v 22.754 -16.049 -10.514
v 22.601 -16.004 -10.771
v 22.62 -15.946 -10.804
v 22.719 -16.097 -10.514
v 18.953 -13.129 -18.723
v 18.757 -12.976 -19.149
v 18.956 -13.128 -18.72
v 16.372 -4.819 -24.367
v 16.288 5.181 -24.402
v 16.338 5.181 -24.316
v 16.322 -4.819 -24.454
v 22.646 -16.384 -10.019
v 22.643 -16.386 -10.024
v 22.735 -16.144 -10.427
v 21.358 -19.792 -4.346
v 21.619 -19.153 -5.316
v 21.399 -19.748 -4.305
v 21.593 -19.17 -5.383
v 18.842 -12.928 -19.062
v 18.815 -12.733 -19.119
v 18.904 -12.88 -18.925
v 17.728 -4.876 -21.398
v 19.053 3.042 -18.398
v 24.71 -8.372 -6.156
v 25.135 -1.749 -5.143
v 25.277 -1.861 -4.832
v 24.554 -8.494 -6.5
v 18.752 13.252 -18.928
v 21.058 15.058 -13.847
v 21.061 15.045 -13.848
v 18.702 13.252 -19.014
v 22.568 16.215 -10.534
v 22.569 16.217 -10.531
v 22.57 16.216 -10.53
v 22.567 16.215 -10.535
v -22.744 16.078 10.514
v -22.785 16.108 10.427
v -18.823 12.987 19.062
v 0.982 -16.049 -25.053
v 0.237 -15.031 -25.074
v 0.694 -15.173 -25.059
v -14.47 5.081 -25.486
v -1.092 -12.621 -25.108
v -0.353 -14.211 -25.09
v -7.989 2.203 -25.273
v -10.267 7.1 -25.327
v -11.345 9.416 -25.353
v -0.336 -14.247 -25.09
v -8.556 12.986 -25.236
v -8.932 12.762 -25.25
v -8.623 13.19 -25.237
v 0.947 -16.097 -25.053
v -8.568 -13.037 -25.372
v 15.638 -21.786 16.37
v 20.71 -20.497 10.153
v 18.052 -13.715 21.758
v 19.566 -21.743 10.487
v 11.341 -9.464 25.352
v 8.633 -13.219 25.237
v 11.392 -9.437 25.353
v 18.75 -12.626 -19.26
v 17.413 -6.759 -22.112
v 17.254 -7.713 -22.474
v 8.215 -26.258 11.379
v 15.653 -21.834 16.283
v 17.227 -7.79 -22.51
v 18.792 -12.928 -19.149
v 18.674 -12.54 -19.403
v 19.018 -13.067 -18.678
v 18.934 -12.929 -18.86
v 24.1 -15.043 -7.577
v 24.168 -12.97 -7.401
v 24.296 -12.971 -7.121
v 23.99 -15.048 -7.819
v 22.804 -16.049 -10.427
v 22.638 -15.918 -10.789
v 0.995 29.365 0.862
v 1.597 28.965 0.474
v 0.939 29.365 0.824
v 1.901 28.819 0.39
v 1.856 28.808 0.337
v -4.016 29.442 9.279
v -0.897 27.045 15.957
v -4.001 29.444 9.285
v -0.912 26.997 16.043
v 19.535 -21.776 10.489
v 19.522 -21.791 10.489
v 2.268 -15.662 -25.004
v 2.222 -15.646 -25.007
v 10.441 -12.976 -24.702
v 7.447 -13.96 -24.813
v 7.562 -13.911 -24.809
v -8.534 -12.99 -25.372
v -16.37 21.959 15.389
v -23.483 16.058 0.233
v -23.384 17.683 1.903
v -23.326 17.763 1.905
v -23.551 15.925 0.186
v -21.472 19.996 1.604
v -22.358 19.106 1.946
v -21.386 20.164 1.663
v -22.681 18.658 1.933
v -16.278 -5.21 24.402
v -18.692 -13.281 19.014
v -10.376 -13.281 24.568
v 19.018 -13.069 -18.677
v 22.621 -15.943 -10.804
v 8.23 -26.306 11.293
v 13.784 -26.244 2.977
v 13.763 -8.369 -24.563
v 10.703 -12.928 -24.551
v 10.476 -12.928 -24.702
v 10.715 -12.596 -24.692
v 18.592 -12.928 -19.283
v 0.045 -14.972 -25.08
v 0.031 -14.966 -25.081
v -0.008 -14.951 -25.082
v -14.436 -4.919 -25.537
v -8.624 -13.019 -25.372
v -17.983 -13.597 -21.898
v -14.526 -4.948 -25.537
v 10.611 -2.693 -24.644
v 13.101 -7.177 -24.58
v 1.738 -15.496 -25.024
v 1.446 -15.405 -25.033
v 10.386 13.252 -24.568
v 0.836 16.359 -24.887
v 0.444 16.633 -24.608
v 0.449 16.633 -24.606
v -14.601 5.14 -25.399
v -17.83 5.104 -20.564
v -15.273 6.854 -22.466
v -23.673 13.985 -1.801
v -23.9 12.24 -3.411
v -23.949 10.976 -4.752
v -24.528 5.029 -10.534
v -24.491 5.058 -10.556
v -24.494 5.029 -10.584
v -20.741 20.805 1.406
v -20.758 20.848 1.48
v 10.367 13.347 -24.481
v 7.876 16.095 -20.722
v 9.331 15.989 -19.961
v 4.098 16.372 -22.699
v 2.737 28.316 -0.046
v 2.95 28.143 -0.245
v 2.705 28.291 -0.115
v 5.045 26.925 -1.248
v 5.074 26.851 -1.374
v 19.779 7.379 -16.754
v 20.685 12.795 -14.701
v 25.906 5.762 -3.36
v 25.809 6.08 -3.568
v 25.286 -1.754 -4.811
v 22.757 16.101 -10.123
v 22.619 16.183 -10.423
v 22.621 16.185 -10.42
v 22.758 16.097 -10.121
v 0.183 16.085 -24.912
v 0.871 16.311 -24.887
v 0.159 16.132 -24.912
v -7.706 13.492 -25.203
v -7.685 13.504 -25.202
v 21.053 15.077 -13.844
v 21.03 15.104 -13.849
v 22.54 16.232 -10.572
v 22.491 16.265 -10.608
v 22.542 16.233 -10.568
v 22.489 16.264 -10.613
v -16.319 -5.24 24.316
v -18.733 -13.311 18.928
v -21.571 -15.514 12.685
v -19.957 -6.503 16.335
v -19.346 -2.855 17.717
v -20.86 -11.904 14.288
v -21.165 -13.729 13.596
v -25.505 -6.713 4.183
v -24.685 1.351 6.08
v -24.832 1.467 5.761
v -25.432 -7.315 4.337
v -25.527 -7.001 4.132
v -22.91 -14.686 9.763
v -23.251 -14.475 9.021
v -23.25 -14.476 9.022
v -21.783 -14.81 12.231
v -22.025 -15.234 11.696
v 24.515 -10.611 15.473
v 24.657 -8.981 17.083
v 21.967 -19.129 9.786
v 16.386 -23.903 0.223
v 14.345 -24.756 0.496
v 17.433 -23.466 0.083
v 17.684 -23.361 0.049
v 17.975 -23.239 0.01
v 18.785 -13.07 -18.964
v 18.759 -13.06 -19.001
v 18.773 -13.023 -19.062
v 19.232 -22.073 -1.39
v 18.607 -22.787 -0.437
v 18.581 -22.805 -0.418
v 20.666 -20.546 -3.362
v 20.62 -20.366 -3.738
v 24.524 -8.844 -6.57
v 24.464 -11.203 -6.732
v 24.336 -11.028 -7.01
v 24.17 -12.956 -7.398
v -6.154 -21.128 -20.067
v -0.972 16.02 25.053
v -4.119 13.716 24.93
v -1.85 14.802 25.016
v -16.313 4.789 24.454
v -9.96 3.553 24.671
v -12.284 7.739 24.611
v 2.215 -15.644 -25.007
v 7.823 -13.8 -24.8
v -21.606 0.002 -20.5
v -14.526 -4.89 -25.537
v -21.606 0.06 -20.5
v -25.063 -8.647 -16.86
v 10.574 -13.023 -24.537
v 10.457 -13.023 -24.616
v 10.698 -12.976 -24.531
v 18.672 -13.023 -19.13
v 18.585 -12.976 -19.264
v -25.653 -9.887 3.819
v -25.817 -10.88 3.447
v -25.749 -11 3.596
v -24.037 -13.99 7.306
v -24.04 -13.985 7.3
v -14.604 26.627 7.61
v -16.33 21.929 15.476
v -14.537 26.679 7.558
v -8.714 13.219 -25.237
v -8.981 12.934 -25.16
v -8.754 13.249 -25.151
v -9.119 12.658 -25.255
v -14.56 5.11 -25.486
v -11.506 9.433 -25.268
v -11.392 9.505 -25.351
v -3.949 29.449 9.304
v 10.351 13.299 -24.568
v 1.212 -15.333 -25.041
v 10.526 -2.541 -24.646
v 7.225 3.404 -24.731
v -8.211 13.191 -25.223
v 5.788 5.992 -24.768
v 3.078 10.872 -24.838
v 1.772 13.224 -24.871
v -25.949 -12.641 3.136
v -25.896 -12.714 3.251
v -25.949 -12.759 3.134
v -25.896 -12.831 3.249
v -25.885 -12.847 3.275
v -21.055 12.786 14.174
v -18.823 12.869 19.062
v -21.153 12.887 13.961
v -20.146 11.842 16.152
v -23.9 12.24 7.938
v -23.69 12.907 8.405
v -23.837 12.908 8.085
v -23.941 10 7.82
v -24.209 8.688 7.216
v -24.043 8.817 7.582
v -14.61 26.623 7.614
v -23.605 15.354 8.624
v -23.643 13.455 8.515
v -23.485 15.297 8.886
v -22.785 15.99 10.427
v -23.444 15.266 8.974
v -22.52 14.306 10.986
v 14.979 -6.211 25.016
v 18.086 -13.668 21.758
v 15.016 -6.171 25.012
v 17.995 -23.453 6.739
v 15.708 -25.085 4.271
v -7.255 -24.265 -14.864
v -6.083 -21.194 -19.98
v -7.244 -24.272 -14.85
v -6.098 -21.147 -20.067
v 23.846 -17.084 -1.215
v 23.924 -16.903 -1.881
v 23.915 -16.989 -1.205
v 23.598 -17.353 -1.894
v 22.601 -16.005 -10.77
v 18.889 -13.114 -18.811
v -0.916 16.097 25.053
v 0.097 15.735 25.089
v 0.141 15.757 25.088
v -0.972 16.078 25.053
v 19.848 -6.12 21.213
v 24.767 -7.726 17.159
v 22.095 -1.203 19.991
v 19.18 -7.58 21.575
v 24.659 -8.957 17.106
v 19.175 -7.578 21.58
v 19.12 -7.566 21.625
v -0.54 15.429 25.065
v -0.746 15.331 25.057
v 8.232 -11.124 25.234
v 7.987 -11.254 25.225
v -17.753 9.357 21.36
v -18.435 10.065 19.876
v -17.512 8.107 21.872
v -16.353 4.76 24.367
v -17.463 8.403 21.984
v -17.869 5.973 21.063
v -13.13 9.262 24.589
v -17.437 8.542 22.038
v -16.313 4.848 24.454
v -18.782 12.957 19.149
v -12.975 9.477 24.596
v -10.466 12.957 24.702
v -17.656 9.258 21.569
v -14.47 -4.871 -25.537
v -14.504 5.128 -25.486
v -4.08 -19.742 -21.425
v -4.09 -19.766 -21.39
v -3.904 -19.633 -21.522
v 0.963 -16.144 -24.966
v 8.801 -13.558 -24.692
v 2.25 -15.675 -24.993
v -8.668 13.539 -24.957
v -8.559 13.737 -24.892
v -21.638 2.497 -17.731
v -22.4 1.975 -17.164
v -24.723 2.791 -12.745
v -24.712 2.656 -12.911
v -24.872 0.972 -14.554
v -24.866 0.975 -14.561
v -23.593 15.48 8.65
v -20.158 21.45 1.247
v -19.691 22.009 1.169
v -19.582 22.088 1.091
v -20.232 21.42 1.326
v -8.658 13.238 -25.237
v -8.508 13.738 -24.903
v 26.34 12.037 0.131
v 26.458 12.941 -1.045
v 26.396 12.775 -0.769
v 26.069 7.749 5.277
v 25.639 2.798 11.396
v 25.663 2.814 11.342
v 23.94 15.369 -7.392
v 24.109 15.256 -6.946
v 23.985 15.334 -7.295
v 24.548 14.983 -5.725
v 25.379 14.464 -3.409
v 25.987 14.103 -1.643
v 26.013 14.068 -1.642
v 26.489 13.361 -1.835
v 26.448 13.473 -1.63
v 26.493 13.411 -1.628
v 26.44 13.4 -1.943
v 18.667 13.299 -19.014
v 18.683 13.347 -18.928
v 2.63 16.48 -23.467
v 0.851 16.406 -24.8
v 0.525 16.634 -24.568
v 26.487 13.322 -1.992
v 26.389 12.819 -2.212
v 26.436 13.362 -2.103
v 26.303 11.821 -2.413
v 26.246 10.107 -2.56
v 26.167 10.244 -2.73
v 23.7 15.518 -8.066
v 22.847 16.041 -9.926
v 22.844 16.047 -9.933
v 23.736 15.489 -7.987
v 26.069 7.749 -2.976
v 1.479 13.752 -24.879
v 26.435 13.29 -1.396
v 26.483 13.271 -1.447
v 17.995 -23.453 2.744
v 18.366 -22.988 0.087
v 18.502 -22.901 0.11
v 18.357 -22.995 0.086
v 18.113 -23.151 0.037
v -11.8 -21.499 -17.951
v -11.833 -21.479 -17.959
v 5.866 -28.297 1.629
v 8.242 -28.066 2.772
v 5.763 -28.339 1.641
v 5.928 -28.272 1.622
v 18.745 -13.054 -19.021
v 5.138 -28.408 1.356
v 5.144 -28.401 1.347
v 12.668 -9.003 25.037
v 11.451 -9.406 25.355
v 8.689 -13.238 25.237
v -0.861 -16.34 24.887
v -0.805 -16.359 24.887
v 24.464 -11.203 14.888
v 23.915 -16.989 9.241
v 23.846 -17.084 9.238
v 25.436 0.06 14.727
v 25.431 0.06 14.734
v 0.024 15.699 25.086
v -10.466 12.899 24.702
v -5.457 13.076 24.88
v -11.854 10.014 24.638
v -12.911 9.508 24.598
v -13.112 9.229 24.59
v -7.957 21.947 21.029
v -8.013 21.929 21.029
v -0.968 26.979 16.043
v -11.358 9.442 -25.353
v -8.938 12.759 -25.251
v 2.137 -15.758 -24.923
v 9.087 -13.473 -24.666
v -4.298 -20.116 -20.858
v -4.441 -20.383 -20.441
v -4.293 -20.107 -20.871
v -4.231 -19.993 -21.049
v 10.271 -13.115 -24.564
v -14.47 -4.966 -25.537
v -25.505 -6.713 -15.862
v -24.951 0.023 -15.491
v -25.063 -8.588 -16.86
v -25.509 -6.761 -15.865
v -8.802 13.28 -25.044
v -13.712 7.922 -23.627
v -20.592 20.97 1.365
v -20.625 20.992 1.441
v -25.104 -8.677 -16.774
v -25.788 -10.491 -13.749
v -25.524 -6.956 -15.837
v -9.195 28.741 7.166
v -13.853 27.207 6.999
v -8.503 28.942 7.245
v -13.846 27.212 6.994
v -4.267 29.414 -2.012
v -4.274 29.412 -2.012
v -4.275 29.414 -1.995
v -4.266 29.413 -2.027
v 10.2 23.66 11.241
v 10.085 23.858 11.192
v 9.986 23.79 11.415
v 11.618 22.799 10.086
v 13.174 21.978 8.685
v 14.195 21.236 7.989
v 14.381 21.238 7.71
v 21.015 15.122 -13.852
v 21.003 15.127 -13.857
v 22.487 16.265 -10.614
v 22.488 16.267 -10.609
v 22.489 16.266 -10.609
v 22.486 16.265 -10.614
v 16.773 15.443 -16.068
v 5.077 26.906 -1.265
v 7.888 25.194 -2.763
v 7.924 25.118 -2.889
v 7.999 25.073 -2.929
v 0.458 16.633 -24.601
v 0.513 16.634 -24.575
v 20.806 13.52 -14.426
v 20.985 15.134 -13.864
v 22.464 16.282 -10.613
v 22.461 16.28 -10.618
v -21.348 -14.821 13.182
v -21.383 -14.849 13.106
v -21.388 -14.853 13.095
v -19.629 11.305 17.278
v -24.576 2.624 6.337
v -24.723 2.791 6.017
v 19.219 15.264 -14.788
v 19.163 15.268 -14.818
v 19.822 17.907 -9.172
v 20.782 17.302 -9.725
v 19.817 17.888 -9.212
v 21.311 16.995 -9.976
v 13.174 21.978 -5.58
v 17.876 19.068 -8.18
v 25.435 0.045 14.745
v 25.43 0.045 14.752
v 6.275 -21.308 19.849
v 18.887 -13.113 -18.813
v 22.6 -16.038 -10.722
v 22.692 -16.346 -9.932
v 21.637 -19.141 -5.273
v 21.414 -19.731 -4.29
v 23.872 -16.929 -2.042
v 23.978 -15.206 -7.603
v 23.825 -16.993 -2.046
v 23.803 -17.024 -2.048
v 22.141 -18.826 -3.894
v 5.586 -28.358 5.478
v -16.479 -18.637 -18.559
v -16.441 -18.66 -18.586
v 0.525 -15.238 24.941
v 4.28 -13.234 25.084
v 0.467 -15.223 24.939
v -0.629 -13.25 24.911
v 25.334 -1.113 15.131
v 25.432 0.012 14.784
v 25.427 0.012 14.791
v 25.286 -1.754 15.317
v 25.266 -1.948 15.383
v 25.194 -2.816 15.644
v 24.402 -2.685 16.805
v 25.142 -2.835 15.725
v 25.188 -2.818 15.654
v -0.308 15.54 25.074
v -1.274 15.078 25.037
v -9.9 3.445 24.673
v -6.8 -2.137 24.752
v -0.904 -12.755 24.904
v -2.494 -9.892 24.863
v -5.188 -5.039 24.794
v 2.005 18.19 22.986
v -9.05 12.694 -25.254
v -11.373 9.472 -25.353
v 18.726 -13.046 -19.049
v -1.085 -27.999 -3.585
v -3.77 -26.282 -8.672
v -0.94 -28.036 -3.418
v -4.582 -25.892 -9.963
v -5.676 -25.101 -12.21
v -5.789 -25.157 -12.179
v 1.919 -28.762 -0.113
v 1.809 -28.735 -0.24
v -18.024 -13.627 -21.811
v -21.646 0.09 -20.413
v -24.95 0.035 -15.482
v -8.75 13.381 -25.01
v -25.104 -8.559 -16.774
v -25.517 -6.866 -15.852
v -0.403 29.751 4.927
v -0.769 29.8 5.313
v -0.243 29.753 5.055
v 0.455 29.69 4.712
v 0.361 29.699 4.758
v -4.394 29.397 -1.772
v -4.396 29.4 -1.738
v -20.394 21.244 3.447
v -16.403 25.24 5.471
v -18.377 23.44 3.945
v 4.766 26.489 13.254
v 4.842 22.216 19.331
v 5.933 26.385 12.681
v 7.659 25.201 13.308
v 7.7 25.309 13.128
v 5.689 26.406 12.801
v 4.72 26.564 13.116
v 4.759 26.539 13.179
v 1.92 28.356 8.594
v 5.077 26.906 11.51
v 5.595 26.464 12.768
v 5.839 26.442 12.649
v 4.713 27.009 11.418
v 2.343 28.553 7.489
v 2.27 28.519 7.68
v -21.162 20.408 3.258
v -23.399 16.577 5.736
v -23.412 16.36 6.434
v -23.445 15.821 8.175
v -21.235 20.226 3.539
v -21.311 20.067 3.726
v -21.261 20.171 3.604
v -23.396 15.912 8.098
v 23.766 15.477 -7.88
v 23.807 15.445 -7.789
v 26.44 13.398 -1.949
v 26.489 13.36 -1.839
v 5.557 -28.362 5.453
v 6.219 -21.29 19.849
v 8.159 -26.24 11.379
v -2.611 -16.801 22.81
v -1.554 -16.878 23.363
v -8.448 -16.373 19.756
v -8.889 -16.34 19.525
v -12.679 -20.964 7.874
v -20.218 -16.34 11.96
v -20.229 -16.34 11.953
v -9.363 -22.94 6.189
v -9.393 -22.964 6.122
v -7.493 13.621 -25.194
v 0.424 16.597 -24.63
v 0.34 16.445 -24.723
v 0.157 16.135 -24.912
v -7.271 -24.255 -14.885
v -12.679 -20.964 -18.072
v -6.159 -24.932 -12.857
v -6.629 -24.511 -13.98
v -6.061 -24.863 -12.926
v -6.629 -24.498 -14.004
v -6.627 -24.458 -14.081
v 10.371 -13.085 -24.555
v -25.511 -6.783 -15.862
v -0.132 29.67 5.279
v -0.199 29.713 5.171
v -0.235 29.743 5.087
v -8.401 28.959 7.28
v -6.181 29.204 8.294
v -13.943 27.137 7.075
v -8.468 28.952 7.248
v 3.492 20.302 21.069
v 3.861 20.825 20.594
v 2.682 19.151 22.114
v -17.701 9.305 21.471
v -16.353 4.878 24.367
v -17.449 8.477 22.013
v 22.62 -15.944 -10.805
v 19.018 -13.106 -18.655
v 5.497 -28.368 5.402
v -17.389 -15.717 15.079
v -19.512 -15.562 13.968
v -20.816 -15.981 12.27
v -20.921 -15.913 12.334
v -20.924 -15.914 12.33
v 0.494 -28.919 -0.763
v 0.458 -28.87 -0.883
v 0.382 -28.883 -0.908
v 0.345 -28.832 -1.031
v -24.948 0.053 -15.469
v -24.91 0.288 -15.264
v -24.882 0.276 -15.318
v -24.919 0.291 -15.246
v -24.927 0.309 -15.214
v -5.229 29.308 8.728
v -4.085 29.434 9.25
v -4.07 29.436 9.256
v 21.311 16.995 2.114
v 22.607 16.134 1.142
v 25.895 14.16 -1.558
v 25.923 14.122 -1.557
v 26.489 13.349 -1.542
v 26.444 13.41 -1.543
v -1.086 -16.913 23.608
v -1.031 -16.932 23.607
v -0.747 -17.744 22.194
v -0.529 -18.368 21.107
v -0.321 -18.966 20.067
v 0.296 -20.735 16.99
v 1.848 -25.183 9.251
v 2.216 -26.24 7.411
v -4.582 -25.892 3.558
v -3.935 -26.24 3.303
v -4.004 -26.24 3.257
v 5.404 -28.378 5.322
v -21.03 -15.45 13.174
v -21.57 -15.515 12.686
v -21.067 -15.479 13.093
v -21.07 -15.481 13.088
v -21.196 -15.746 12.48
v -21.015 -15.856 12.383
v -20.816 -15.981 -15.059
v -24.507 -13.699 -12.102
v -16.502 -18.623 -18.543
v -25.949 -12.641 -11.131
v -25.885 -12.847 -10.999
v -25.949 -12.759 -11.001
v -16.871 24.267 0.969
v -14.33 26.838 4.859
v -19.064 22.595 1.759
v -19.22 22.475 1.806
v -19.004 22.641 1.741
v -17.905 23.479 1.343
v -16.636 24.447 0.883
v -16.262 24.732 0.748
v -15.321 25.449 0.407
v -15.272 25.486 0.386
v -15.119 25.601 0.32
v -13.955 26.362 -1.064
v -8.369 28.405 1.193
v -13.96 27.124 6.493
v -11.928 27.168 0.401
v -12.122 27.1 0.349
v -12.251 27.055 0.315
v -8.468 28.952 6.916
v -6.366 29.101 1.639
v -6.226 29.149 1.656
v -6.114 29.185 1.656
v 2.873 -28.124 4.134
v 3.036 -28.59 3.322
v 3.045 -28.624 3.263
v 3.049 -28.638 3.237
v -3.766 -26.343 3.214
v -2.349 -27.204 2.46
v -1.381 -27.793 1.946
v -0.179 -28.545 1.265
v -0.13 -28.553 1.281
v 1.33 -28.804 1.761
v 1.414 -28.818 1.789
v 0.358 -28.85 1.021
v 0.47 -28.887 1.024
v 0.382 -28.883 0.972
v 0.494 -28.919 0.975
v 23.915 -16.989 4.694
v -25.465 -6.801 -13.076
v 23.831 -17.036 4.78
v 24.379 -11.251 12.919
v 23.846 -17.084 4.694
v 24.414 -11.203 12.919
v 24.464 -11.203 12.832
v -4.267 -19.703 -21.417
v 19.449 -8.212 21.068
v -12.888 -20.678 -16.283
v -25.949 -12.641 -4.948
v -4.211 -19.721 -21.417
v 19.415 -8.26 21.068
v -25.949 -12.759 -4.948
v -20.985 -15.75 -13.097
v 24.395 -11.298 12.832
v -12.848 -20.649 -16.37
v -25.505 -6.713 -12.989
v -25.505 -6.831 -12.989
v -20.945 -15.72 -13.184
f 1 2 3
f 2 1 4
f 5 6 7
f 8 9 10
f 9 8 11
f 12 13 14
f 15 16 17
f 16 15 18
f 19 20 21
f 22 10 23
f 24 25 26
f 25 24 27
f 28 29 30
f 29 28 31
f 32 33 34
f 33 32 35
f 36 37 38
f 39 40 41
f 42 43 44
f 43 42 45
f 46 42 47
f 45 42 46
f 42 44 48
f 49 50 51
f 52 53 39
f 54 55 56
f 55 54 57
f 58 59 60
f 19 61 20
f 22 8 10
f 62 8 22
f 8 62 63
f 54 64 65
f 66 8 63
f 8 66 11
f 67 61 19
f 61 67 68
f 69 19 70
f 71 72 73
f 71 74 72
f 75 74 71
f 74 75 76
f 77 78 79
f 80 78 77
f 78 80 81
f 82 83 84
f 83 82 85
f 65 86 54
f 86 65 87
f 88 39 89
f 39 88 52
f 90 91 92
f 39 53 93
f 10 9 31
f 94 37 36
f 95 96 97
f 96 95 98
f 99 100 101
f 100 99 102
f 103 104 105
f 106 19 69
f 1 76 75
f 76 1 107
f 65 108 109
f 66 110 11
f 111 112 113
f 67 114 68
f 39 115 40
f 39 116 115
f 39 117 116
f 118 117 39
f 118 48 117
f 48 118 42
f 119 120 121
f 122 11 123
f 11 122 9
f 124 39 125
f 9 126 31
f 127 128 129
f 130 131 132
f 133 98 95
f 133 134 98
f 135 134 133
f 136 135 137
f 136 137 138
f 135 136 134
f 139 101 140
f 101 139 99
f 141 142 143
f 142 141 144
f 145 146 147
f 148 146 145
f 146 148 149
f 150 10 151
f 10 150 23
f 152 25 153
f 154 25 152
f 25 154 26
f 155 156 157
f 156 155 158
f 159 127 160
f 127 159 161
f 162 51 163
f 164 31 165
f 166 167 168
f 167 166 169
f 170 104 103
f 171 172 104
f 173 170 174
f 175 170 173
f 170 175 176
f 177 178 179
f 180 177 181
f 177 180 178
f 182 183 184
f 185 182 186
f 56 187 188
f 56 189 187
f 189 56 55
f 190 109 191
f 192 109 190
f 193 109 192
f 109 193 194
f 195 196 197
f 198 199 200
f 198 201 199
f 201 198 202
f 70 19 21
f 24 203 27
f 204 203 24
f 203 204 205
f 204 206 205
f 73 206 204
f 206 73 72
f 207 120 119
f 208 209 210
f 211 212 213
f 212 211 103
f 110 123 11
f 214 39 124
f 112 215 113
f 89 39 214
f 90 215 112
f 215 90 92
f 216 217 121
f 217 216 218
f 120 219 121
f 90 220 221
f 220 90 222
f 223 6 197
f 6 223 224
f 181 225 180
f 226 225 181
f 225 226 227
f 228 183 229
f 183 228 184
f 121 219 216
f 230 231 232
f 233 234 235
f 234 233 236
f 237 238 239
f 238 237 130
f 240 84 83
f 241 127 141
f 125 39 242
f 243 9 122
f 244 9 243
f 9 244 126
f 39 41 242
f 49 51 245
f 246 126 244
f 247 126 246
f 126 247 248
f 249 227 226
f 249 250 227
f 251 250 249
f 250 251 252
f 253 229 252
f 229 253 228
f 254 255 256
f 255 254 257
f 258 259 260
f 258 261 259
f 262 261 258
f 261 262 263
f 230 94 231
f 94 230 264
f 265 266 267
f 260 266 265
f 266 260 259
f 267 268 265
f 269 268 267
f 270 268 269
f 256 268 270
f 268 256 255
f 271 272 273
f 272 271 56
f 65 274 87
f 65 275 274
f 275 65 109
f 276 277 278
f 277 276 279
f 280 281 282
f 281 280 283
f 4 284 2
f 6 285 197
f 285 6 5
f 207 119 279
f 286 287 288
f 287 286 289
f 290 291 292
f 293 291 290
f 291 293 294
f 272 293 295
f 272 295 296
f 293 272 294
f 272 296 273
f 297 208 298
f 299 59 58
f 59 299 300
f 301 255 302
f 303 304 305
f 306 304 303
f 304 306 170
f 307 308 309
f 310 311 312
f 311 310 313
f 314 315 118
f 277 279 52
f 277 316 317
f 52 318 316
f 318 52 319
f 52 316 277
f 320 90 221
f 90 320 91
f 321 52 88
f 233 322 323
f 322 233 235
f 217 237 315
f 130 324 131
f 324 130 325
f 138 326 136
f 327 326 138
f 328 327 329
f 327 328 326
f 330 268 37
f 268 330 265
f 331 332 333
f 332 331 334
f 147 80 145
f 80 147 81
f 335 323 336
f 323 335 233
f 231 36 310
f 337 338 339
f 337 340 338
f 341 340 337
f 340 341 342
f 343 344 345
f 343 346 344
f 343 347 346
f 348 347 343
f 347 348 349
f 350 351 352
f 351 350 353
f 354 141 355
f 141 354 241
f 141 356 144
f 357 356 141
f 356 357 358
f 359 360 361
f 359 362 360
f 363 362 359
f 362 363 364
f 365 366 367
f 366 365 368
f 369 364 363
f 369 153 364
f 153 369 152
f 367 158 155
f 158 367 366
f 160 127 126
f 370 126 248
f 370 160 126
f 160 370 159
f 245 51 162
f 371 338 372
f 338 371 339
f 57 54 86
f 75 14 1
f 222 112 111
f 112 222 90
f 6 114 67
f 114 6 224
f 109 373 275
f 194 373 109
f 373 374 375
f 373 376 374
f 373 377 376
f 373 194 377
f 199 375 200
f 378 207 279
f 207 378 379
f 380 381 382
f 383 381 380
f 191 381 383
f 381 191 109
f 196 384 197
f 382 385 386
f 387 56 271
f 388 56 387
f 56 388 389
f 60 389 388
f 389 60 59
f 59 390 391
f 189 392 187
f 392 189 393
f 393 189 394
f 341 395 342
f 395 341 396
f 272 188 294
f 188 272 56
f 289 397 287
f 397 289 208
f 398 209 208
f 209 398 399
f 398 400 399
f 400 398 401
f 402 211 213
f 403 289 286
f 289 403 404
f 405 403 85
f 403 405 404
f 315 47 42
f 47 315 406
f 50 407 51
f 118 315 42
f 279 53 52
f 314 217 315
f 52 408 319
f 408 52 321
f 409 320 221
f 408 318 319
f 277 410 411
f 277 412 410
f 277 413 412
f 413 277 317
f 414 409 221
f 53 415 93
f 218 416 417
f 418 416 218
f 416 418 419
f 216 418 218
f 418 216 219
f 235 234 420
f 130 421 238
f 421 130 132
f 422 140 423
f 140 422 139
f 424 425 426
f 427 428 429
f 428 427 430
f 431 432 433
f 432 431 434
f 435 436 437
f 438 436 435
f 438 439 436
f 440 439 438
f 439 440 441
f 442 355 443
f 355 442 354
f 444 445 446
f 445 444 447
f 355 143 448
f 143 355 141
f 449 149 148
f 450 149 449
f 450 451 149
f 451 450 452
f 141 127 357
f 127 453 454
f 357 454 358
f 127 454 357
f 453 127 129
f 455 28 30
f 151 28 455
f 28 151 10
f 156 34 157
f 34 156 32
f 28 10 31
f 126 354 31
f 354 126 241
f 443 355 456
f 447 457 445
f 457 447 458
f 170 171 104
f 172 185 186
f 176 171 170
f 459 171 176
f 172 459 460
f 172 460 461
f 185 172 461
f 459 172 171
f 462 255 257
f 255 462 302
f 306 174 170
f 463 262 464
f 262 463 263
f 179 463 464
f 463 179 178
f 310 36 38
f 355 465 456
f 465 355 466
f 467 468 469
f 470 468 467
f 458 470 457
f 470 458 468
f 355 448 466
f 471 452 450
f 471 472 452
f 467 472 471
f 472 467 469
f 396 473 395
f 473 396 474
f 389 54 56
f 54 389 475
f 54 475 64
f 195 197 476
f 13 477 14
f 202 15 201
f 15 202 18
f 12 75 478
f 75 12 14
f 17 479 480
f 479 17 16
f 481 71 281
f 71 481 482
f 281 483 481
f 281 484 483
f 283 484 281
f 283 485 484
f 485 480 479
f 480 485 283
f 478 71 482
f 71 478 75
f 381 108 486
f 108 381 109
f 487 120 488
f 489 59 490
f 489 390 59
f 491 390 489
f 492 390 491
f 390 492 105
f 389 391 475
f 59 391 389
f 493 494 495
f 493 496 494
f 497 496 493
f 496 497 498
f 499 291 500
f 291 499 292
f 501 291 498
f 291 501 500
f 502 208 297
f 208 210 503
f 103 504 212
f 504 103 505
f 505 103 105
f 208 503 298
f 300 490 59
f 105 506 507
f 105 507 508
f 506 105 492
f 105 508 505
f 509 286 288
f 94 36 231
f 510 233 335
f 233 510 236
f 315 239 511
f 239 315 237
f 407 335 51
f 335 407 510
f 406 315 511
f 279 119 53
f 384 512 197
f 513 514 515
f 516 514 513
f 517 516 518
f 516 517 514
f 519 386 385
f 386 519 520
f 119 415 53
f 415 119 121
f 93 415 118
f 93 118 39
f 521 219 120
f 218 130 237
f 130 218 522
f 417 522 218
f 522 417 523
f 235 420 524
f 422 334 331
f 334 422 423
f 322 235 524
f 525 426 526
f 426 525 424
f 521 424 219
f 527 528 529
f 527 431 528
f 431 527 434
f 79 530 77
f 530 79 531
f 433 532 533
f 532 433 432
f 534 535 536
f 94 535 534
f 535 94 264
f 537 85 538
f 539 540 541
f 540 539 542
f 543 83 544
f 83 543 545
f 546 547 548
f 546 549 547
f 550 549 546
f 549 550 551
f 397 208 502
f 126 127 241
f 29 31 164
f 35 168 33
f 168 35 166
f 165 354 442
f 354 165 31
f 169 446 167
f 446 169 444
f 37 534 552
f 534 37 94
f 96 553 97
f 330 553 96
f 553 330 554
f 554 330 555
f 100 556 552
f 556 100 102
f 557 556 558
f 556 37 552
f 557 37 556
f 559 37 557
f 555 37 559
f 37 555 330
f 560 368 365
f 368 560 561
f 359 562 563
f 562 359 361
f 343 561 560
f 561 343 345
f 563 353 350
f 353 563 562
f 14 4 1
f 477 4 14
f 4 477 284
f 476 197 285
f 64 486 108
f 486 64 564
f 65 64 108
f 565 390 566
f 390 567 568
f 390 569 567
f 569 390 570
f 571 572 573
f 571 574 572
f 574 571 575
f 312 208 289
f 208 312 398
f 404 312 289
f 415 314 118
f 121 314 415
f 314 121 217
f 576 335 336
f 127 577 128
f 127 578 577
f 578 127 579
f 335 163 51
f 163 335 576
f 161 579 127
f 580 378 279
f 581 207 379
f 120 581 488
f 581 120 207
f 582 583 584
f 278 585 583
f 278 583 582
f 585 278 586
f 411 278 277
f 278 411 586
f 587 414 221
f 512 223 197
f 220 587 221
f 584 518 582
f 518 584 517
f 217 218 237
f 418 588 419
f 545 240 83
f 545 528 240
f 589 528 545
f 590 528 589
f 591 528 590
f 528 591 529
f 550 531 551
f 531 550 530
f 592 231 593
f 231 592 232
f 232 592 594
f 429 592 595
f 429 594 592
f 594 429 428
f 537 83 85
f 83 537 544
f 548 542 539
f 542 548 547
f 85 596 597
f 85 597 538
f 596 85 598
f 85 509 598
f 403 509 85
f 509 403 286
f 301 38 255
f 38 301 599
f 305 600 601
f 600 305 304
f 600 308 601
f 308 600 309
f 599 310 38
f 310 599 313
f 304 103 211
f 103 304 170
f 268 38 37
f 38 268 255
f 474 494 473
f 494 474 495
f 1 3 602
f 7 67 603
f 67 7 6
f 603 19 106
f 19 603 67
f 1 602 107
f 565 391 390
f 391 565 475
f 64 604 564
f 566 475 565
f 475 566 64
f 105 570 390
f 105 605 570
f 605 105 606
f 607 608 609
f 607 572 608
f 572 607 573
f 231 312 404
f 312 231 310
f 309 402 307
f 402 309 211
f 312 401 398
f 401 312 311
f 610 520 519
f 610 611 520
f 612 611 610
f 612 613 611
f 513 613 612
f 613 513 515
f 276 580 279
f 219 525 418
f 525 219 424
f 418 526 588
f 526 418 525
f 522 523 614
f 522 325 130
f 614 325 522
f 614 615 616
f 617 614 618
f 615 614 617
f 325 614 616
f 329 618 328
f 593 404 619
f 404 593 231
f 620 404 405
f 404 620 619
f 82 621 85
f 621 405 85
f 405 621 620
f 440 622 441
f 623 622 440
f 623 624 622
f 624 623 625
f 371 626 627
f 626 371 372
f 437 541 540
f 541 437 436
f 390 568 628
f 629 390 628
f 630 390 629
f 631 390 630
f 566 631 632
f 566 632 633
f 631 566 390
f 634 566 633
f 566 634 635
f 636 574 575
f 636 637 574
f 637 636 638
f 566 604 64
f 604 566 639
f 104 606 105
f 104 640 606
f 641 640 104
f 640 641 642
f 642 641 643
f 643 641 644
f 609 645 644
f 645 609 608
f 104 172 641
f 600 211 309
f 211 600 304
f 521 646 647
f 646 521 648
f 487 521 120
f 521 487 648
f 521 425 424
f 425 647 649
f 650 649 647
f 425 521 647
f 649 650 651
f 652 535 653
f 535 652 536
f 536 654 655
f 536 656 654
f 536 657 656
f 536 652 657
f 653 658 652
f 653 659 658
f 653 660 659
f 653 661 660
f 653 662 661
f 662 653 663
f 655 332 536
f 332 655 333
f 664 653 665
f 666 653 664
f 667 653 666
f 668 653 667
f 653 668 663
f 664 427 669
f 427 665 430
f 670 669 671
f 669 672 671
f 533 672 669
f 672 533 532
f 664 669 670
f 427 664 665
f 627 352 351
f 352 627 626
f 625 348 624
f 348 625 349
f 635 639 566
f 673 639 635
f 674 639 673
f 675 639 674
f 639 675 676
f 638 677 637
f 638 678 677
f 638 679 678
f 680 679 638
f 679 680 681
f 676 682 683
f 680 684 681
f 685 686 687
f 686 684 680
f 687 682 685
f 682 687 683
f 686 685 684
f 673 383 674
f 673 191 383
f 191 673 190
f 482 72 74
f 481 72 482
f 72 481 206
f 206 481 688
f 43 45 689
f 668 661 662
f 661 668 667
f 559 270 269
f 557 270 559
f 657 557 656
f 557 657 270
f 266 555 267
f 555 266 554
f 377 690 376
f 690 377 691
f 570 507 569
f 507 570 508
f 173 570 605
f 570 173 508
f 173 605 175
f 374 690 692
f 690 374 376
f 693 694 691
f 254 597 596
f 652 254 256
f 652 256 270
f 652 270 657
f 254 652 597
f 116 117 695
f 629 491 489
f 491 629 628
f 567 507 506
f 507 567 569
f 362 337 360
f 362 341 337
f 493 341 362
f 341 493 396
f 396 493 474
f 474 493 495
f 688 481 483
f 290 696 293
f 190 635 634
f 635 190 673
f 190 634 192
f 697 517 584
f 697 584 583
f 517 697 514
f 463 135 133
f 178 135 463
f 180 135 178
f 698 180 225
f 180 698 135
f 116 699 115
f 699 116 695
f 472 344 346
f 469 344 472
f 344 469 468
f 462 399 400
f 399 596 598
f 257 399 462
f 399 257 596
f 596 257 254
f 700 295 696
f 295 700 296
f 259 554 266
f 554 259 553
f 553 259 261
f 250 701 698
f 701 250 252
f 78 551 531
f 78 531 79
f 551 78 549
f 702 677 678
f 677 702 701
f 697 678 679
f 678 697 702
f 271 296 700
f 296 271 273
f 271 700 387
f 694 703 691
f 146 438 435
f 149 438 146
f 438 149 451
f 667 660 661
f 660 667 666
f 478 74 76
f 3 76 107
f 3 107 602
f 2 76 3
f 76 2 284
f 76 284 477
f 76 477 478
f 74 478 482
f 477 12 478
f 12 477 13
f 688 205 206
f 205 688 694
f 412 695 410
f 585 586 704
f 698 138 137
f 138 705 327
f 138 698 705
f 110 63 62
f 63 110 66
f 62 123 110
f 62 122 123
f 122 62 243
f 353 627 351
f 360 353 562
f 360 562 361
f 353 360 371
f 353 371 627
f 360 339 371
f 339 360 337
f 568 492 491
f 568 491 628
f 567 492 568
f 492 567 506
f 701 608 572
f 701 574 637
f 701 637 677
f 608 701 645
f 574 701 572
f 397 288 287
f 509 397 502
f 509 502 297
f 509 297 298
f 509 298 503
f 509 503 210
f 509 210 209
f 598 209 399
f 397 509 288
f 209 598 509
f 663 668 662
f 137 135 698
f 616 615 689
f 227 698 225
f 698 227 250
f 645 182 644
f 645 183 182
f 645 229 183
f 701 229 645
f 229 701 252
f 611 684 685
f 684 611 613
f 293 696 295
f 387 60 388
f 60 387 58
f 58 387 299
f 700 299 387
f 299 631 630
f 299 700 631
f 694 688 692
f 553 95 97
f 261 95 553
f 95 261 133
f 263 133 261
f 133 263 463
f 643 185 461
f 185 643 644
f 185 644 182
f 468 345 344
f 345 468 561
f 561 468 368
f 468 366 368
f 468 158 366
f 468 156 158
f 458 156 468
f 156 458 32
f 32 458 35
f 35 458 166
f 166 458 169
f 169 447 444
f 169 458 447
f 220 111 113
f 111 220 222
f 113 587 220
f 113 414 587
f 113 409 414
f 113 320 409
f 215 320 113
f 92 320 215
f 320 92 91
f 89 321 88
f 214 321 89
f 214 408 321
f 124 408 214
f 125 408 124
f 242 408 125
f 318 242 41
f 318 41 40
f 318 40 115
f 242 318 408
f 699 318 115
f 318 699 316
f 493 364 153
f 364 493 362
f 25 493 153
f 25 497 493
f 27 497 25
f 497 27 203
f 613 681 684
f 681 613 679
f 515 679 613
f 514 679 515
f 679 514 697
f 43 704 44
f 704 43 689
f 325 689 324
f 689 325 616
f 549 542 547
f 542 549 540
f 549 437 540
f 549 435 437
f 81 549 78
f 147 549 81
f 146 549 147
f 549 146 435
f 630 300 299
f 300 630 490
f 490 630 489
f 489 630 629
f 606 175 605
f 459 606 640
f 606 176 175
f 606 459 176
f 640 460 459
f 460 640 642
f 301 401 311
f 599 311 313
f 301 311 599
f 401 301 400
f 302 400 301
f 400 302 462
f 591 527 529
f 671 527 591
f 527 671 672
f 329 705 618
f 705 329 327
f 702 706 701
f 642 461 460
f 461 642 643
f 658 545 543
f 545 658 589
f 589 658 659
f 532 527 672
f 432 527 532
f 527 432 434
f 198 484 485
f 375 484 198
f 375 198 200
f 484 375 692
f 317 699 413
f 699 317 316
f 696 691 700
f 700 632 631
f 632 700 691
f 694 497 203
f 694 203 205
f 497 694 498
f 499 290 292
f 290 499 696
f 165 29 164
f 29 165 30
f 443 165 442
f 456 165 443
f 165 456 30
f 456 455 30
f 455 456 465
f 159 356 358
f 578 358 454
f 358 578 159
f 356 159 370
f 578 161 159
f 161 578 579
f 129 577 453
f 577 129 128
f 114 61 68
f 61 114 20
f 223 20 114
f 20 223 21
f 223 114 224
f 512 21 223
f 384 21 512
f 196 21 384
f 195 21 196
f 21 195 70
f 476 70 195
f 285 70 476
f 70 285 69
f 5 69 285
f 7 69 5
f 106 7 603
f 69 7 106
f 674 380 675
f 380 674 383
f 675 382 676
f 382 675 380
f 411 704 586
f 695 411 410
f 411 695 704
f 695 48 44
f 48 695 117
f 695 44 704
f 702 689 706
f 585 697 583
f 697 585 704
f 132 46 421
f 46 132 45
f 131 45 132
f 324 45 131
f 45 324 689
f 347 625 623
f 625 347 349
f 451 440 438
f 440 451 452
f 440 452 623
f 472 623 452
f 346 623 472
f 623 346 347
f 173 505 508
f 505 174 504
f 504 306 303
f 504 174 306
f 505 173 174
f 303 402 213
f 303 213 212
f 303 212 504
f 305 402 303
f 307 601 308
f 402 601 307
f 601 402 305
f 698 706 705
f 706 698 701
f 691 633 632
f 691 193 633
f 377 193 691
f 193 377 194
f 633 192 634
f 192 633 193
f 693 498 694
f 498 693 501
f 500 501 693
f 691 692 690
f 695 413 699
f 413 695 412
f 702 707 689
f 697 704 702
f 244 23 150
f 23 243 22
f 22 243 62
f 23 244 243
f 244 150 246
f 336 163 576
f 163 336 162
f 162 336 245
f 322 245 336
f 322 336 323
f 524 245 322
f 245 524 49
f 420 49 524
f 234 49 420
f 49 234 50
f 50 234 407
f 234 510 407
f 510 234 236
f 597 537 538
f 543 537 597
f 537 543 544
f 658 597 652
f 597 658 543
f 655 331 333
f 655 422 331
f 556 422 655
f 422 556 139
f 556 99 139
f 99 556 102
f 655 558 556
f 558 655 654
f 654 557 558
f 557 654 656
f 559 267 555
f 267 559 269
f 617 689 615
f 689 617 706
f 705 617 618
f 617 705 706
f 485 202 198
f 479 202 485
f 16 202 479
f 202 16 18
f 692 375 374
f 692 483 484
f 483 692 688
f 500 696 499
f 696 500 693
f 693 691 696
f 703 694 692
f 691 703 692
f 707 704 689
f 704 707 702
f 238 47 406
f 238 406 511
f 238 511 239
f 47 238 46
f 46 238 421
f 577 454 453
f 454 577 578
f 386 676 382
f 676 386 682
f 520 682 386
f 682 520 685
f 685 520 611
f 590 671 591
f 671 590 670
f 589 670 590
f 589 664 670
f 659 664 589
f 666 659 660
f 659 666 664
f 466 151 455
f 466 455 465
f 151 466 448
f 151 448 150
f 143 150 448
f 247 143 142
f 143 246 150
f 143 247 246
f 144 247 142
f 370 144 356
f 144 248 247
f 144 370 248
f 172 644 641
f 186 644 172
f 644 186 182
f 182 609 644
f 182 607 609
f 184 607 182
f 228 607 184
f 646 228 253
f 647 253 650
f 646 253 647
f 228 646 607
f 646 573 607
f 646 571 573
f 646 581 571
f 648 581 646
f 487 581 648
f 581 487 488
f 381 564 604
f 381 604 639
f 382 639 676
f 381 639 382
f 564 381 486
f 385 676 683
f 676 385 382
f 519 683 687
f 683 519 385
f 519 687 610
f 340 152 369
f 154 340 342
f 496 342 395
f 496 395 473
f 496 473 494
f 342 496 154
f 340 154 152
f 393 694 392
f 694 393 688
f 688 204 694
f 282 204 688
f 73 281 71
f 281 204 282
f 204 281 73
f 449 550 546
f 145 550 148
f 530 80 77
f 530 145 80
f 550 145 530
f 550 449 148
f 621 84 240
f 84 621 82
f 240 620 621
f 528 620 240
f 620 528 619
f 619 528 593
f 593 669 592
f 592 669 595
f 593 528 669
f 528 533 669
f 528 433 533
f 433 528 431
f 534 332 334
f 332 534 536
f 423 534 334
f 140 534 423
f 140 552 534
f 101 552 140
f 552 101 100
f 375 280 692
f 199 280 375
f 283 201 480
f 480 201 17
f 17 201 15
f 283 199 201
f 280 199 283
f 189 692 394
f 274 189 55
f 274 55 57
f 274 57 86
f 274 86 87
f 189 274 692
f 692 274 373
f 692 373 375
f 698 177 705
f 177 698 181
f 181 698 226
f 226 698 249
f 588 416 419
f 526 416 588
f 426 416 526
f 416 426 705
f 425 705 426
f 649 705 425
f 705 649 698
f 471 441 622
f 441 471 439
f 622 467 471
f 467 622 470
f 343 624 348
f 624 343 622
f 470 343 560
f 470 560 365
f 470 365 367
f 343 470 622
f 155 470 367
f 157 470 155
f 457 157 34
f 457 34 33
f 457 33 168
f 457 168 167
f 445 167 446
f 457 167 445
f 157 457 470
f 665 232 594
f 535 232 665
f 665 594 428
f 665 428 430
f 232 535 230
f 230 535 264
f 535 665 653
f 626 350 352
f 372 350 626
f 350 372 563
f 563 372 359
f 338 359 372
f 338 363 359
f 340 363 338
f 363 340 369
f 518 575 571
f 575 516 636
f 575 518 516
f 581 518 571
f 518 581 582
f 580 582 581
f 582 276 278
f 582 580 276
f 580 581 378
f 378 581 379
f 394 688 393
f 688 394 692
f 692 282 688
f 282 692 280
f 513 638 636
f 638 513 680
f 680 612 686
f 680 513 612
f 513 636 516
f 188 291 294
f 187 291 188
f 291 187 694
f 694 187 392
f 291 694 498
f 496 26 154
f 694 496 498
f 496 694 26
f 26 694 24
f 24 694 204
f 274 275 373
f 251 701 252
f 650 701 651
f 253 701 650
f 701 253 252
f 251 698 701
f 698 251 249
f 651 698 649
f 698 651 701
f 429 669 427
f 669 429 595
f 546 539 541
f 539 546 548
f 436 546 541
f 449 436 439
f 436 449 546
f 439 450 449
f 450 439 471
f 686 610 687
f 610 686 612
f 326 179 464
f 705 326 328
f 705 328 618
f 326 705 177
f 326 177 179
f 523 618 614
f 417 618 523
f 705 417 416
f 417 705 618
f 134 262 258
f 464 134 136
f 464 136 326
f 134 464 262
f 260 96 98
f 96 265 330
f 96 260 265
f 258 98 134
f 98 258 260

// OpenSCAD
// Auto-generated OpenSCAD file

    inner_points = 10*[[2.5800168516054605, 0.7980470298110209, -1.3189669327443228], [-2.4432744118438516, 0.24459871431141972, 1.6358172684915129], [2.4977459589942073, -0.14685368717772146, -1.6358172684915129], [-2.525545304455105, -0.7003020026773228, 1.3189669327443228], [-1.0273929293488884, 1.013504771559999, -2.6028581143850014], [-1.8854735183802727, 0.9189645126628418, -2.098120715161195], [1.9399450655306283, -0.8212194855291437, 2.098120715161195], [1.081864476499244, -0.9157597444263008, 2.6028581143850014], [0.014605949080104583, 2.9713492457347006, 0.5259255605908952], [-0.4670162451205472, -2.5601958994998366, -1.3289486129136048], [0.521487792270903, 2.657940926633535, 1.3289486129136048], [0.03986559807025124, -2.873604218601002, -0.5259255605908952], [2.1279729957209983, 1.6899773807507408, -1.3081687185560238], [-2.3649952986203884, 1.194958158554797, 1.3346706145662746], [1.9125850025799456, -0.7838048123199333, -2.137693666888984], [-2.5803832917614407, -1.2788240345158768, 0.5051456662333142], [2.6348548389117963, 1.376569061649575, -0.5051456662333142], [-1.85811345542959, 0.8815498394536314, 2.137693666888984], [2.419466845770744, -1.0972131314210989, -1.3346706145662746], [-2.0735014485706427, -1.5922323536170426, 1.3081687185560238], [-0.13542060028755343, 1.465591309374031, -2.6046263101375176], [-2.3819047474582464, 1.218081698276059, -1.2832066435763685], [-0.21769149289880618, 0.5206905923852883, -2.921476645884708], [-2.464175640069499, 0.27318098128731644, -1.600056979323559], [2.518647187219855, -0.17543595415361818, 1.600056979323559], [0.27216304004916203, -0.42294556525159, 2.921476645884708], [2.436376294608602, -1.1203366711423608, 1.2832066435763685], [0.18989214743790928, -1.3678462822403328, 2.6046263101375176], [0.008147114355070081, 2.980181651968014, -0.47401457364421196], [-0.8499334746763137, 2.8856413930708573, 0.03072282557959416], [-0.4226288719270348, -1.967382734173334, -2.1330644703101322], [-1.2807094609584186, -2.0619229930704908, -1.6283270710863262], [1.3351810081087743, 2.1596680202041894, 1.6283270710863262], [0.47710041907739065, 2.0651277613070325, 2.1330644703101322], [0.9044050218266696, -2.7878963659371587, -0.03072282557959416], [0.04632443279528574, -2.8824366248343156, 0.47401457364421196], [1.3142797798831267, 2.1882502871800864, -1.6075471767287453], [-2.320607925426876, 1.7877713238812996, 0.5305547571697469], [1.0480455788235277, -0.8695126649837768, -2.632896401900285], [-2.5868421264864754, -1.2699916282825632, -0.49479446800179294], [2.641313673636831, 1.3677366554162613, 0.49479446800179294], [-0.9935740316731719, 0.9672576921174749, 2.632896401900285], [2.3750794725772315, -1.6900262967476014, -0.5305547571697469], [-1.259808232732771, -2.090505260046388, 1.6075471767287453], [0.4497403561267084, 2.1025424345162427, -2.1027499117400468], [-2.3270667601519106, 1.796603730114613, -0.4693853770653609], [0.23435236298565587, -0.37123975855443125, -2.932274860073007], [-2.542454753292963, -0.677178462956061, -1.298910325398321], [2.5969263004433185, 0.7749234900897591, 1.298910325398321], [-0.17988081583530008, 0.4689847856881295, 2.932274860073007], [2.3815383073022662, -1.6988587029809148, 0.4693853770653609], [-0.3952688089763525, -2.004797407382544, 2.1027499117400468], [0.5045783434330445, 2.681064466354797, -1.2889286452290385], [-1.7419058037376494, 2.4335548552568254, 0.03249102133211079], [0.1560732497621926, -1.321599202797809, -2.6311282061477685], [-2.090410897408501, -1.569108813895781, -1.3097085395866195], [2.144882444558857, 1.666853841029479, 1.3097085395866195], [-0.10160170261183678, 1.419344229931507, 2.6311282061477685], [1.796377350888005, -2.3358098281231268, -0.03249102133211079], [-0.4501067962826887, -2.5833194392210985, 1.2889286452290385], [-0.5368524378149407, 2.2594080955840976, -2.1477812710372692], [-1.9252559959542506, 2.1064387433832827, -1.3310990036999262], [2.2038011054775724, 0.5648442997397853, 2.1940747320103373], [0.8153975473382632, 0.4118749475389705, 3.0107569993476804], [0.5632820446898252, -2.1233159333049074, -2.1935995998160314], [1.3834340952527309, -2.630421245967566, -0.8942810074082022], [-0.4820144505086047, 2.8379301274226516, -1.3339600045262612], [-1.3400950395399884, 2.7433898685254943, -0.8292226053024551], [1.7517572495931102, 1.456774650679505, 2.204872946198636], [0.8936766605617265, 1.3622343917823476, 2.7096103454224423], [1.4552543737511603, -1.6712293954908752, -2.1953677955685476], [1.9621362169419587, -1.984637714592041, -1.3923447432458382], [-1.428824766876276, 1.807321557770065, -2.1460130752847526], [1.6250989837883454, -0.08093923163574031, 2.6921384678479736], [0.5188946714963129, -2.7161290986314097, -1.3894837424195032]];

    outer_points = 10*[[-1.6237729602140323, -0.5180972863871907, 2.431576450233078], [1.6272083434635762, -0.4818835798868834, -2.4367208868087524], [-1.6272083434635762, 0.4818835798868834, 2.4367208868087524], [1.6237729602140323, 0.5180972863871907, -2.431576450233078], [-2.71186219611676, -0.003093019792710145, -1.2097195213409813], [-2.156528291374358, 0.003093019792710145, -2.0413239869120874], [2.156528291374358, -0.003093019792710145, 2.0413239869120874], [2.71186219611676, 0.003093019792710145, 1.2097195213409813], [-0.40575464686575385, -2.92699497773356, -0.29273029341267365], [-0.425865730701731, 2.92699497773356, -0.26261423713977006], [0.425865730701731, -2.92699497773356, 0.26261423713977006], [0.40575464686575385, 2.92699497773356, 0.29273029341267365], [-1.8651962514487022, -1.3251872098929274, 1.8927623358810832], [1.0425698239929058, -1.292796686112162, -2.4615751762416114], [-1.8741902015603906, 1.292796686112162, 1.9062306456891678], [1.0335758738812173, 1.3251872098929274, -2.448106866433527], [-1.0335758738812173, -1.3251872098929274, 2.448106866433527], [1.8741902015603906, -1.292796686112162, -1.9062306456891678], [-1.0425698239929058, 1.292796686112162, 2.4615751762416114], [1.8651962514487022, 1.3251872098929274, -1.8927623358810832], [-2.902434241444326, -0.5080880640822284, -0.3678986967098157], [-1.4485512037235218, -0.4918928021918457, -2.545067452771163], [-2.90586962469387, 0.4918928021918457, -0.36275426013414114], [-1.451986586973066, 0.5080880640822284, -2.5399230161954884], [1.451986586973066, -0.5080880640822284, 2.5399230161954884], [2.90586962469387, -0.4918928021918457, 0.36275426013414114], [1.4485512037235218, 0.4918928021918457, 2.545067452771163], [2.902434241444326, 0.5080880640822284, 0.3678986967098157], [-1.3572782093638605, -2.6210769157977993, -0.3246215052488573], [-0.8019443046214587, -2.6148908762123795, -1.1562259708199636], [-1.3752661095872372, 2.6148908762123795, -0.2976848856326887], [-0.8199322048448355, 2.6210769157977993, -1.129289351203795], [0.8199322048448355, -2.6210769157977993, 1.129289351203795], [1.3752661095872372, -2.6148908762123795, 0.2976848856326887], [0.8019443046214587, 2.6148908762123795, 1.1562259708199636], [1.3572782093638605, 2.6210769157977993, 0.3246215052488573], [-2.2592627255918067, -1.631105271828688, 1.026087221817059], [0.09316944510739966, -1.604900787633343, -2.49664582473453], [-2.2703798593160958, 1.604900787633343, 1.042734968281878], [0.08205231138311109, 1.631105271828688, -2.4799980782697113], [-0.08205231138311109, -1.631105271828688, 2.4799980782697113], [2.2703798593160958, -1.604900787633343, -1.042734968281878], [-0.09316944510739966, 1.604900787633343, 2.49664582473453], [2.2592627255918067, 1.631105271828688, -1.026087221817059], [-2.655452383347512, -1.319001170307507, 0.16259154440976942], [-0.8583541173907071, -1.2989827256975823, -2.5285370365707136], [-2.6644463334592, 1.2989827256975823, 0.17605985421785353], [-0.8673480675023955, 1.319001170307507, -2.51506872676263], [0.8673480675023955, -1.319001170307507, 2.51506872676263], [2.6644463334592, -1.2989827256975823, -0.17605985421785353], [0.8583541173907071, 1.2989827256975823, 2.5285370365707136], [2.655452383347512, 1.319001170307507, -0.16259154440976942], [-2.065255297014697, -2.126091093813244, 0.17912196061021834], [-0.6113722592938928, -2.109895831922861, -1.9980467954511292], [-2.0798078139885297, 2.109895831922861, 0.20091414365071247], [-0.6259247762677257, 2.126091093813244, -1.976254612410635], [0.6259247762677257, -2.126091093813244, 1.976254612410635], [2.0798078139885297, -2.109895831922861, -0.20091414365071247], [0.6113722592938928, 2.109895831922861, 1.9980467954511292], [2.065255297014697, 2.126091093813244, -0.17912196061021834], [-2.692835524077599, -1.3667819536544716, -0.8355665079706667], [-1.7942863910991966, -1.3567727313495095, -2.1811307984609085], [1.8036430242705312, -1.3667819536544716, 2.167119376032807], [2.7021921572489336, -1.3567727313495095, 0.8215550855425657], [-1.438337984179842, 2.6949682886817636, 0.6971063219317848], [-0.0927479475386308, 2.6949682886817636, 1.5956726478319931], [-2.102638437744784, -2.173871877160208, -0.8190360917702175], [-1.5473045330023827, -2.1676858375747883, -1.6506405573413236], [1.5622197330358616, -2.173871877160208, 1.628305261680813], [2.117553637778263, -2.1676858375747883, 0.7967007961097068], [-1.628910029507408, 2.1899732443922453, 1.5389271465629506], [-0.7972896519399231, 2.1899732443922453, 2.0942716771153944], [-2.502263478750033, -0.8617869093649534, -1.6773873326018327], [2.5081847286718237, -0.8617869093649534, 1.668520346749406], [-0.4889376052943356, 3.0070723902029446, 0.7321769704247032]];

    // Convex hull for inner set (I)
    module inner_hull() {
        hull() {
            for (p = inner_points) {
                translate(p) sphere(r=0.1);
            }
        }
    }

    // Convex hull for outer set (O) minus inner hull (O \ I)
    module outer_minus_inner() {
        difference() {
            hull() {
                for (p = outer_points) {
                    translate(p) sphere(r=0.1);
                }
            }
            inner_hull(); // Subtract inner hull
        }
    }

    // Convex hull for outer set (O) minus all translated inner hulls
    module outer_minus_AllTranslationInner() {
        difference() {
            hull() {
                for (p = outer_points) {
                    translate(p) sphere(r=0.1);
                }
            }
            hull() {
                translate([0,0,50]) inner_hull();
                translate([0,0,-50]) inner_hull();
            }; // Subtract translated inner hulls
        }
    }

    // Difference between outer_minus_inner and outer_minus_AllTranslationInner
    module outer_minus_inner_diff() {
        difference() {
            // Outer minus inner
            difference() {
                hull() {
                    for (p = outer_points) {
                        translate(p) sphere(r=0.1);
                    }
                }
                inner_hull();
            }

            // Subtract Outer minus AllTranslationInner
            difference() {
                hull() {
                    for (p = outer_points) {
                        translate(p) sphere(r=0.1);
                    }
                }
                hull() {
                    translate([0,0,50]) inner_hull();
                    translate([0,0,-50]) inner_hull();
                };
            }
        }
    }

    // Rendering all with colors applied
    color([1, 1, 0, 1]) outer_minus_inner_diff(); // Opaque yellow
    
